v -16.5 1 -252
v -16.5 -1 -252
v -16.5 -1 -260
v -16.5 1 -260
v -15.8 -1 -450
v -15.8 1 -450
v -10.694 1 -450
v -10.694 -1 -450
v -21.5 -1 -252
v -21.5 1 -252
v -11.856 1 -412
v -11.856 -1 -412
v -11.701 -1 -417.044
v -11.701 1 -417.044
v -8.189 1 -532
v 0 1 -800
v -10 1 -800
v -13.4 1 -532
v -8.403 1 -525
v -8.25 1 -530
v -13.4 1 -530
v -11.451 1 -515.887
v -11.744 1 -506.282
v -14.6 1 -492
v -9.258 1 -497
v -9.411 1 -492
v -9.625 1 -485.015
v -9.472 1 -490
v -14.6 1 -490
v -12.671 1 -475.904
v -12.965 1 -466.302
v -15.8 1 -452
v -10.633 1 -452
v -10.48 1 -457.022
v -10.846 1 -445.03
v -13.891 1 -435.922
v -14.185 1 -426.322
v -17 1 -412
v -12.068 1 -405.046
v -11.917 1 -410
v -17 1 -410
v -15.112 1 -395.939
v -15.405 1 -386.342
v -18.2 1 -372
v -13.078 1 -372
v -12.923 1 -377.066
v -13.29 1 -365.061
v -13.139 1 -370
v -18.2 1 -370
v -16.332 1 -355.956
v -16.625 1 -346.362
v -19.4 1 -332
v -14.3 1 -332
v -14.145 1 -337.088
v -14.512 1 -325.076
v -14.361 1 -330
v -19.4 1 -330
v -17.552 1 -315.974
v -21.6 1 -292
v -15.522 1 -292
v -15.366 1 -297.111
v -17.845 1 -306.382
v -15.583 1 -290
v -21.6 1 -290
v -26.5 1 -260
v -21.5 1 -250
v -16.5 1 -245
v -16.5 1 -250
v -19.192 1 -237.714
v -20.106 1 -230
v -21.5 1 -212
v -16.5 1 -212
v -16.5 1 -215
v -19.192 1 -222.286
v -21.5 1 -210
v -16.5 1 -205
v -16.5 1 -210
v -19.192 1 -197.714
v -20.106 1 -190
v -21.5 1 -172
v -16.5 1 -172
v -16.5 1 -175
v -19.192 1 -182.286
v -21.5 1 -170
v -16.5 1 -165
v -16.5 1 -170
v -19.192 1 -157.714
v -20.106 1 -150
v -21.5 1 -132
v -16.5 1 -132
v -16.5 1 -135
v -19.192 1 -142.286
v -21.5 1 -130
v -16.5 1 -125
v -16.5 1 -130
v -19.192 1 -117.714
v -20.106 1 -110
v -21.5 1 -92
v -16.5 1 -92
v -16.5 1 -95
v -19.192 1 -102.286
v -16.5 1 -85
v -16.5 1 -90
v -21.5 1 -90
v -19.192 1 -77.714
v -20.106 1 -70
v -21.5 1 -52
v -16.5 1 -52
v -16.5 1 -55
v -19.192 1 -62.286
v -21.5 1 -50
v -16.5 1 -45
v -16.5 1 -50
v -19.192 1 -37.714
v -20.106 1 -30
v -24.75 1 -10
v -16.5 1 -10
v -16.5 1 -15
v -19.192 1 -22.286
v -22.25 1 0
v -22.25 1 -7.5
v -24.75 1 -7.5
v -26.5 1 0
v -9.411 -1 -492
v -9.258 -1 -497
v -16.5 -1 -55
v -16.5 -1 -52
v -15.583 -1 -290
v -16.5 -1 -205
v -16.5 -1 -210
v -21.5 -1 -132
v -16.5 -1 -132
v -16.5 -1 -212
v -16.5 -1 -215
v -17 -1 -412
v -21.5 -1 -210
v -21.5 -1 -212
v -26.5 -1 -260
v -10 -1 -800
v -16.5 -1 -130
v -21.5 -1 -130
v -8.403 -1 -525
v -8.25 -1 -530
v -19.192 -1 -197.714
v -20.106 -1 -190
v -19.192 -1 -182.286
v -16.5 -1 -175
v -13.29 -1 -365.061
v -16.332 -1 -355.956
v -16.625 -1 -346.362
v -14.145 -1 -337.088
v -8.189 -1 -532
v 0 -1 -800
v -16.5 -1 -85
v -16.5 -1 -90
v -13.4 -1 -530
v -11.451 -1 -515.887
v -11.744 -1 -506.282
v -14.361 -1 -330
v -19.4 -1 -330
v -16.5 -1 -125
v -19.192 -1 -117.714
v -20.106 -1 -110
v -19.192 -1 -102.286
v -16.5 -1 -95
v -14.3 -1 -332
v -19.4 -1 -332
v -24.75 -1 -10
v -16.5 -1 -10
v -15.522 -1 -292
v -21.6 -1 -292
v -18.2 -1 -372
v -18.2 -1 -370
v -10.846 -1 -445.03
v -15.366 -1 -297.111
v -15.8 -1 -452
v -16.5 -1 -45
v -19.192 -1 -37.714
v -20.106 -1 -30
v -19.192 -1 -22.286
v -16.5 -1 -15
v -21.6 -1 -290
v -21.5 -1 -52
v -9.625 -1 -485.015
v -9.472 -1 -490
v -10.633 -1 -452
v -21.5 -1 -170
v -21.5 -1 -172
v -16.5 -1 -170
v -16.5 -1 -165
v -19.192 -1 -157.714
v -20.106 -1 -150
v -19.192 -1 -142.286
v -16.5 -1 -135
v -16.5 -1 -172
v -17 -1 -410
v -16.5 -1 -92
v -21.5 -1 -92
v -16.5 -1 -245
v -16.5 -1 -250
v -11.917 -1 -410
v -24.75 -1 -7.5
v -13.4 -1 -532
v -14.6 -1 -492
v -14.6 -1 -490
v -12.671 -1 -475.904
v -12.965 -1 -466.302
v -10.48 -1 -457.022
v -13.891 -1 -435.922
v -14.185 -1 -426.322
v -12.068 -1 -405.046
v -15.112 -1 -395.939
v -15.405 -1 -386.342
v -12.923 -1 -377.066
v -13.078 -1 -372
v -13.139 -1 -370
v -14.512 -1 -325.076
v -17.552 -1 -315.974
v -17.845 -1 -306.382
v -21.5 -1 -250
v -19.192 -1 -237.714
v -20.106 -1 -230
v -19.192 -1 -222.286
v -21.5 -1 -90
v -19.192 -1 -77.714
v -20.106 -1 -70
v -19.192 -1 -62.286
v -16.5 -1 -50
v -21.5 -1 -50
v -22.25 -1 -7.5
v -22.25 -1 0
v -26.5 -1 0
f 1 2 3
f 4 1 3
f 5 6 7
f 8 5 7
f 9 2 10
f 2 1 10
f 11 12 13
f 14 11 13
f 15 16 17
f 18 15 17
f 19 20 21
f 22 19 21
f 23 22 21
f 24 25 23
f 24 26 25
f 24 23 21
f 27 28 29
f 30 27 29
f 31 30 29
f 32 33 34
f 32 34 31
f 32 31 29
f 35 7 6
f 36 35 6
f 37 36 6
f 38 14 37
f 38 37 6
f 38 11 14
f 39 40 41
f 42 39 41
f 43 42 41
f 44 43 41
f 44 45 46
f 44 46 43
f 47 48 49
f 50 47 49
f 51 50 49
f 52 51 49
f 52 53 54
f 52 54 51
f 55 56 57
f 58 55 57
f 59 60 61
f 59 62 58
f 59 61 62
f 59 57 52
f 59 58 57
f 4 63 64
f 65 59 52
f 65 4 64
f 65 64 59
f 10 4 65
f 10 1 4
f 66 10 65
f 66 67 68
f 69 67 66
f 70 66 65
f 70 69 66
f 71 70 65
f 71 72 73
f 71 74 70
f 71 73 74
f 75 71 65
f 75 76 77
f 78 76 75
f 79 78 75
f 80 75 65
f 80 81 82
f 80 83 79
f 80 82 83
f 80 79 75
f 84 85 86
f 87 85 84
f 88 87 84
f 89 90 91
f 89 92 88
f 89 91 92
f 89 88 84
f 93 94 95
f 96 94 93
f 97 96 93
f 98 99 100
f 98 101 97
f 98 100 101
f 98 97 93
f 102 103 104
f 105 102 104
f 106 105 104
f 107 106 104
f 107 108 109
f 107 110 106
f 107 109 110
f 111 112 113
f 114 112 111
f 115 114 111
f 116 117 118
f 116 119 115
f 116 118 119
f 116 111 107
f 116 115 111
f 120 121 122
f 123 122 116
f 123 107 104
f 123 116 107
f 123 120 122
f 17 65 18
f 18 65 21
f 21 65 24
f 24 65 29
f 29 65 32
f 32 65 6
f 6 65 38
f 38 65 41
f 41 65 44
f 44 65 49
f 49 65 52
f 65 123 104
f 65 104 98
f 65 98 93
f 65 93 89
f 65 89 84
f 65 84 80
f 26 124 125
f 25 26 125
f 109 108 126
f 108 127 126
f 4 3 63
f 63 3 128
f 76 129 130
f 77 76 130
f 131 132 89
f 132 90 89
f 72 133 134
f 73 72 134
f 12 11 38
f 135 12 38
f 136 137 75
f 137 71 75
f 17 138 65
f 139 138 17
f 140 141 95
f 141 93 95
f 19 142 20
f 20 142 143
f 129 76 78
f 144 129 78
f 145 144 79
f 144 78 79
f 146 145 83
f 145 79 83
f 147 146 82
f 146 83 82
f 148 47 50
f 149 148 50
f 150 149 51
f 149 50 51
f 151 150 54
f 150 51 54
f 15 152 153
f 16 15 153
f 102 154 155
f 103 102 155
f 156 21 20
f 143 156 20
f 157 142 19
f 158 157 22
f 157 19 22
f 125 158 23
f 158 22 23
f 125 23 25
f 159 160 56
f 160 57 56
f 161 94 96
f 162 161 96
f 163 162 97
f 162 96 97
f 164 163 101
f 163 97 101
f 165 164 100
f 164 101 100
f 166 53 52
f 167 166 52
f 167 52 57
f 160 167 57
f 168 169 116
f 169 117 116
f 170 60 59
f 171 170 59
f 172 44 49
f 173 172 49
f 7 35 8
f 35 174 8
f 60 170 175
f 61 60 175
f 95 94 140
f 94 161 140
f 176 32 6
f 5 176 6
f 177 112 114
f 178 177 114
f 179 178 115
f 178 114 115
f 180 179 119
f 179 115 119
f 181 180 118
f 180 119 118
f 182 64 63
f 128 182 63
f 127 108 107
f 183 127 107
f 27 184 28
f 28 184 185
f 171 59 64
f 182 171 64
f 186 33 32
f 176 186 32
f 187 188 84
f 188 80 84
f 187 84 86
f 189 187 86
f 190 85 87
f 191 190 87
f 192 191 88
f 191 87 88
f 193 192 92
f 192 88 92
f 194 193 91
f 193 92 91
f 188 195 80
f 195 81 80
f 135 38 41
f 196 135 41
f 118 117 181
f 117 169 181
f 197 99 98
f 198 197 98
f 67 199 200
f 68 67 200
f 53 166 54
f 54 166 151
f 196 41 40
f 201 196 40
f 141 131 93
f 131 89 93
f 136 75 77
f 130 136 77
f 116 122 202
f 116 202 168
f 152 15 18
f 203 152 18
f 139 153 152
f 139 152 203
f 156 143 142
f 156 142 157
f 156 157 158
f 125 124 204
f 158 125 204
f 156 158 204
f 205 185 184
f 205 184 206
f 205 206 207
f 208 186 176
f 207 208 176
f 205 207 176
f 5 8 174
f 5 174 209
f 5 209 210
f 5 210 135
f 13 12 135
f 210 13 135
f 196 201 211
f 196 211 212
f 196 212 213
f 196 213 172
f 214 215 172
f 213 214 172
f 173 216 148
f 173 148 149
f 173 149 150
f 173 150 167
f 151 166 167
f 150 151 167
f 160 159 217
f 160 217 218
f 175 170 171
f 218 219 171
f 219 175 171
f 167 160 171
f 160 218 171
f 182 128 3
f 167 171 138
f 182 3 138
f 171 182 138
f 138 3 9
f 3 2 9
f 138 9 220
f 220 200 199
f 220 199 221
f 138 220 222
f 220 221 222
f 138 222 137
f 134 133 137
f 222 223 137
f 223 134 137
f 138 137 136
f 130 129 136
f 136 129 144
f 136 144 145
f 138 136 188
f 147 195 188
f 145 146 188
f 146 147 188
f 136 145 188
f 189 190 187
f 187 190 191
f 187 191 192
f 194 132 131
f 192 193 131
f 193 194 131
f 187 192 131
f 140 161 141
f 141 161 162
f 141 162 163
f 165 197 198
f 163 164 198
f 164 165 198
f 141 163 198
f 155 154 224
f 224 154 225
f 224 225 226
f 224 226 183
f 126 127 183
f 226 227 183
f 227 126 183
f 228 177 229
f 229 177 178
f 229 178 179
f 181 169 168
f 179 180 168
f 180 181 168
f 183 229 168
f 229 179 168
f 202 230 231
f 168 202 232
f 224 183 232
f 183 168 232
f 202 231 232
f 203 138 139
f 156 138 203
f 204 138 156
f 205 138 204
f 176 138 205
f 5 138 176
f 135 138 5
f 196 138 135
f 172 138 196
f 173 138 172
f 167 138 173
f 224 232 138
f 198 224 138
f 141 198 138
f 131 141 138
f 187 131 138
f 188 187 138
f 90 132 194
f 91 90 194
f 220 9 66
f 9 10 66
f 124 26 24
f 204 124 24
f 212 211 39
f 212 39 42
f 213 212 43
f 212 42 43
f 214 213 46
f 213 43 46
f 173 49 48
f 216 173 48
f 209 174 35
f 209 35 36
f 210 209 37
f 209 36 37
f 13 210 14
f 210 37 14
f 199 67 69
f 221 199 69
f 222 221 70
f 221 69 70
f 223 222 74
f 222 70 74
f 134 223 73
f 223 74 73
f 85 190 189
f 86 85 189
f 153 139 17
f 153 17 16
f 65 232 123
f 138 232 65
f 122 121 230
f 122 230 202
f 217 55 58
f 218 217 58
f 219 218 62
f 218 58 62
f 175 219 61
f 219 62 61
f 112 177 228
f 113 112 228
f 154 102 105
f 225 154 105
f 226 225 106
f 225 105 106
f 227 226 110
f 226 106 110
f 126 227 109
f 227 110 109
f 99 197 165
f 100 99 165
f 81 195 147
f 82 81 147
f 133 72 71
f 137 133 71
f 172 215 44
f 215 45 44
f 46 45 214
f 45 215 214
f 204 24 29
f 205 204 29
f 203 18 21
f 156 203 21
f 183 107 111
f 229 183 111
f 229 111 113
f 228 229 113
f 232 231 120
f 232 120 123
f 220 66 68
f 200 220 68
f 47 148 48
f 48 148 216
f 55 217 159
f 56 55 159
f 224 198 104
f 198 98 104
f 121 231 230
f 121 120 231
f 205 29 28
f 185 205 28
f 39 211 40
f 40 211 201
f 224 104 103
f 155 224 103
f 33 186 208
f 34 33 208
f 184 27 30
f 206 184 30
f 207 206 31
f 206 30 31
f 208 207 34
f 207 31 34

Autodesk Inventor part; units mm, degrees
ref_plane "YZ Plane" through (0, 0, 0) normal (1, 0, 0) x (0, 1, 0)
ref_plane "XZ Plane" through (0, 0, 0) normal (0, 1, 0) x (-1, 0, 0)
ref_plane "XY Plane" through (0, 0, 0) normal (0, 0, 1) x (1, 0, 0)
sketch "Sketch1" plane through (0, 0, 0) normal (0, 1, 0) x (-1, 0, 0)
  line L0 (0, 0) -> (26.5, 0)
  line L1 (26.5, 0) -> (26.5, -260)
  line L2 (26.5, -260) -> (10, -800)
  line L3 (10, -800) -> (0, -800)
  line L4 (0, 0) -> (0, -10)
  line L5 (0, -10) -> (16.5, -10)
  line L6 (16.5, -10) -> (16.5, -260)
  line L7 (16.5, -260) -> (0, -800)
  dimension "d1" = 26.5
  dimension "d2" = 10
  dimension "d3" = 260
  dimension "d4" = 10
  dimension "d6" = 10
  dimension "d7" = 250
  dimension "d8" = 0
  dimension "d9" = 800
extrude "Extrusion1" add sketch "Sketch1" along normal mid plane 2
sketch "Sketch2" plane through (0, 1, 0) normal (0, 1, 0) x (1, 0, 0)
  line L0 (-21.5, 50) -> (0, 50)
  line L1 (0, 50) -> (0, 52)
  line L2 (0, 52) -> (-21.5, 52)
  line L3 (-21.5, 52) -> (-21.5, 50)
  line L4 (0, 0) -> (0, 10) projected
  line L5 (0, 10) -> (-16.5, 10) projected
  dimension "d12" = 2
  dimension "d13" = 21.5
  dimension "d14" = 0
  dimension "d16" = 40
extrude "Extrusion2" cut sketch "Sketch2" against normal through all
pattern_linear "Rectangular Pattern1" count 6 spacing 40 along (0, 0, -1) of "Extrusion2"
sketch "Sketch3" plane through (0, 1, 0) normal (0, 1, 0) x (1, 0, 0)
  line L0 (-21.6, 290) -> (0, 290)
  line L1 (0, 290) -> (0, 292)
  line L2 (0, 292) -> (-21.6, 292)
  line L3 (-21.6, 292) -> (-21.6, 290)
  line L4 (0, 0) -> (0, 10) projected
  line L5 (-16.5, 250) -> (-21.5, 250) projected
  line L6 (-19.4, 330) -> (0, 330)
  line L7 (0, 330) -> (0, 332)
  line L8 (0, 332) -> (-19.4, 332)
  line L9 (-19.4, 332) -> (-19.4, 330)
  line L10 (-18.2, 370) -> (0, 370)
  line L11 (0, 370) -> (0, 372)
  line L12 (0, 372) -> (-18.2, 372)
  line L13 (-18.2, 372) -> (-18.2, 370)
  line L14 (-17, 410) -> (0, 410)
  line L15 (0, 410) -> (0, 412)
  line L16 (0, 412) -> (-17, 412)
  line L17 (-17, 412) -> (-17, 410)
  line L18 (-15.8, 450) -> (0, 450)
  line L19 (0, 450) -> (0, 452)
  line L20 (0, 452) -> (-15.8, 452)
  line L21 (-15.8, 452) -> (-15.8, 450)
  line L22 (-14.6, 490) -> (0, 490)
  line L23 (0, 490) -> (0, 492)
  line L24 (0, 492) -> (-14.6, 492)
  line L25 (-14.6, 492) -> (-14.6, 490)
  line L26 (-13.4, 530) -> (0, 530)
  line L27 (0, 530) -> (0, 532)
  line L28 (0, 532) -> (-13.4, 532)
  line L29 (-13.4, 532) -> (-13.4, 530)
  point P0 (-26.5, 250)
  dimension "d22" = 2
  dimension "d23" = 0
  dimension "d24" = 40
  dimension "d25" = 21.6
  dimension "d84" = 40
  dimension "d85" = 2
  dimension "d86" = 0
  dimension "d87" = 19.4
  dimension "d88" = 40
  dimension "d89" = 2
  dimension "d90" = 0
  dimension "d91" = 18.2
  dimension "d92" = 40
  dimension "d93" = 2
  dimension "d94" = 0
  dimension "d95" = 17
  dimension "d96" = 40
  dimension "d97" = 2
  dimension "d98" = 0
  dimension "d99" = 15.8
  dimension "d100" = 40
  dimension "d101" = 2
  dimension "d102" = 0
  dimension "d103" = 14.6
  dimension "d104" = 40
  dimension "d105" = 2
  dimension "d106" = 13.4
  dimension "d107" = 0
extrude "Extrusion3" cut sketch "Sketch3" against normal through all
sketch "Sketch11" plane through (0, 1, 0) normal (0, 1, 0) x (1, 0, 0)
  line L0 (-22.25, 0) -> (0, 0)
  line L1 (0, 0) -> (0, 10)
  line L2 (0, 10) -> (-22.25, 10)
  line L3 (-22.25, 0) -> (-22.25, 7.5)
  line L4 (-22.25, 7.5) -> (-24.75, 7.5)
  line L5 (-24.75, 7.5) -> (-24.75, 10)
  line L6 (-24.75, 10) -> (-22.25, 10)
  dimension "d108" = 2.5
  dimension "d110" = 2.5
  dimension "d111" = 10
  dimension "d112" = 24.75
extrude "Extrusion11" cut sketch "Sketch11" against normal blind 10
sketch "Sketch12" plane through (0, 1, 0) normal (0, 1, 0) x (1, 0, 0)
  line L0 (-16.5, 50) -> (-16.5, 10) projected
  arc A0 (-16.5, 45) -> (-16.5, 15) centre (12.8939, 30) ccw
  line L1 (-24.75, 10) -> (-16.5, 10) projected
  line L2 (-16.5, 50) -> (-21.5, 50) projected
  line L3 (-16.5, 15) -> (-16.5, 45)
  point P0 (0, 0)
  dimension "d115" = 33
  dimension "d116" = 5
  dimension "d117" = 5
extrude "Extrusion12" cut sketch "Sketch12" against normal blind 10
pattern_linear "Rectangular Pattern2" count 6 spacing 40 along (0, 0, -1) of "Extrusion12"
sketch "Sketch13" plane through (0, 1, 0) normal (0, 1, 0) x (1, 0, 0)
  arc A0 (-8.4028, 525) -> (-9.2583, 497) centre (21.0355, 510.0874) ccw
  line L0 (-9.2583, 497) -> (-8.4028, 525)
  line L1 (-14.6, 492) -> (-9.4111, 492) projected
  line L2 (-8.25, 530) -> (-13.4, 530) projected
  line L3 (-9.4111, 492) -> (-8.25, 530) projected
  point P0 (0, 0)
  dimension "d123" = 5
  dimension "d124" = 5
  dimension "d125" = 33
extrude "Extrusion13" cut sketch "Sketch13" against normal blind 10
pattern_linear "Rectangular Pattern3" count 6 spacing 40 along (-0.0305, 0, 0.9995) of "Extrusion13"
properties part number "traverse_cote"
